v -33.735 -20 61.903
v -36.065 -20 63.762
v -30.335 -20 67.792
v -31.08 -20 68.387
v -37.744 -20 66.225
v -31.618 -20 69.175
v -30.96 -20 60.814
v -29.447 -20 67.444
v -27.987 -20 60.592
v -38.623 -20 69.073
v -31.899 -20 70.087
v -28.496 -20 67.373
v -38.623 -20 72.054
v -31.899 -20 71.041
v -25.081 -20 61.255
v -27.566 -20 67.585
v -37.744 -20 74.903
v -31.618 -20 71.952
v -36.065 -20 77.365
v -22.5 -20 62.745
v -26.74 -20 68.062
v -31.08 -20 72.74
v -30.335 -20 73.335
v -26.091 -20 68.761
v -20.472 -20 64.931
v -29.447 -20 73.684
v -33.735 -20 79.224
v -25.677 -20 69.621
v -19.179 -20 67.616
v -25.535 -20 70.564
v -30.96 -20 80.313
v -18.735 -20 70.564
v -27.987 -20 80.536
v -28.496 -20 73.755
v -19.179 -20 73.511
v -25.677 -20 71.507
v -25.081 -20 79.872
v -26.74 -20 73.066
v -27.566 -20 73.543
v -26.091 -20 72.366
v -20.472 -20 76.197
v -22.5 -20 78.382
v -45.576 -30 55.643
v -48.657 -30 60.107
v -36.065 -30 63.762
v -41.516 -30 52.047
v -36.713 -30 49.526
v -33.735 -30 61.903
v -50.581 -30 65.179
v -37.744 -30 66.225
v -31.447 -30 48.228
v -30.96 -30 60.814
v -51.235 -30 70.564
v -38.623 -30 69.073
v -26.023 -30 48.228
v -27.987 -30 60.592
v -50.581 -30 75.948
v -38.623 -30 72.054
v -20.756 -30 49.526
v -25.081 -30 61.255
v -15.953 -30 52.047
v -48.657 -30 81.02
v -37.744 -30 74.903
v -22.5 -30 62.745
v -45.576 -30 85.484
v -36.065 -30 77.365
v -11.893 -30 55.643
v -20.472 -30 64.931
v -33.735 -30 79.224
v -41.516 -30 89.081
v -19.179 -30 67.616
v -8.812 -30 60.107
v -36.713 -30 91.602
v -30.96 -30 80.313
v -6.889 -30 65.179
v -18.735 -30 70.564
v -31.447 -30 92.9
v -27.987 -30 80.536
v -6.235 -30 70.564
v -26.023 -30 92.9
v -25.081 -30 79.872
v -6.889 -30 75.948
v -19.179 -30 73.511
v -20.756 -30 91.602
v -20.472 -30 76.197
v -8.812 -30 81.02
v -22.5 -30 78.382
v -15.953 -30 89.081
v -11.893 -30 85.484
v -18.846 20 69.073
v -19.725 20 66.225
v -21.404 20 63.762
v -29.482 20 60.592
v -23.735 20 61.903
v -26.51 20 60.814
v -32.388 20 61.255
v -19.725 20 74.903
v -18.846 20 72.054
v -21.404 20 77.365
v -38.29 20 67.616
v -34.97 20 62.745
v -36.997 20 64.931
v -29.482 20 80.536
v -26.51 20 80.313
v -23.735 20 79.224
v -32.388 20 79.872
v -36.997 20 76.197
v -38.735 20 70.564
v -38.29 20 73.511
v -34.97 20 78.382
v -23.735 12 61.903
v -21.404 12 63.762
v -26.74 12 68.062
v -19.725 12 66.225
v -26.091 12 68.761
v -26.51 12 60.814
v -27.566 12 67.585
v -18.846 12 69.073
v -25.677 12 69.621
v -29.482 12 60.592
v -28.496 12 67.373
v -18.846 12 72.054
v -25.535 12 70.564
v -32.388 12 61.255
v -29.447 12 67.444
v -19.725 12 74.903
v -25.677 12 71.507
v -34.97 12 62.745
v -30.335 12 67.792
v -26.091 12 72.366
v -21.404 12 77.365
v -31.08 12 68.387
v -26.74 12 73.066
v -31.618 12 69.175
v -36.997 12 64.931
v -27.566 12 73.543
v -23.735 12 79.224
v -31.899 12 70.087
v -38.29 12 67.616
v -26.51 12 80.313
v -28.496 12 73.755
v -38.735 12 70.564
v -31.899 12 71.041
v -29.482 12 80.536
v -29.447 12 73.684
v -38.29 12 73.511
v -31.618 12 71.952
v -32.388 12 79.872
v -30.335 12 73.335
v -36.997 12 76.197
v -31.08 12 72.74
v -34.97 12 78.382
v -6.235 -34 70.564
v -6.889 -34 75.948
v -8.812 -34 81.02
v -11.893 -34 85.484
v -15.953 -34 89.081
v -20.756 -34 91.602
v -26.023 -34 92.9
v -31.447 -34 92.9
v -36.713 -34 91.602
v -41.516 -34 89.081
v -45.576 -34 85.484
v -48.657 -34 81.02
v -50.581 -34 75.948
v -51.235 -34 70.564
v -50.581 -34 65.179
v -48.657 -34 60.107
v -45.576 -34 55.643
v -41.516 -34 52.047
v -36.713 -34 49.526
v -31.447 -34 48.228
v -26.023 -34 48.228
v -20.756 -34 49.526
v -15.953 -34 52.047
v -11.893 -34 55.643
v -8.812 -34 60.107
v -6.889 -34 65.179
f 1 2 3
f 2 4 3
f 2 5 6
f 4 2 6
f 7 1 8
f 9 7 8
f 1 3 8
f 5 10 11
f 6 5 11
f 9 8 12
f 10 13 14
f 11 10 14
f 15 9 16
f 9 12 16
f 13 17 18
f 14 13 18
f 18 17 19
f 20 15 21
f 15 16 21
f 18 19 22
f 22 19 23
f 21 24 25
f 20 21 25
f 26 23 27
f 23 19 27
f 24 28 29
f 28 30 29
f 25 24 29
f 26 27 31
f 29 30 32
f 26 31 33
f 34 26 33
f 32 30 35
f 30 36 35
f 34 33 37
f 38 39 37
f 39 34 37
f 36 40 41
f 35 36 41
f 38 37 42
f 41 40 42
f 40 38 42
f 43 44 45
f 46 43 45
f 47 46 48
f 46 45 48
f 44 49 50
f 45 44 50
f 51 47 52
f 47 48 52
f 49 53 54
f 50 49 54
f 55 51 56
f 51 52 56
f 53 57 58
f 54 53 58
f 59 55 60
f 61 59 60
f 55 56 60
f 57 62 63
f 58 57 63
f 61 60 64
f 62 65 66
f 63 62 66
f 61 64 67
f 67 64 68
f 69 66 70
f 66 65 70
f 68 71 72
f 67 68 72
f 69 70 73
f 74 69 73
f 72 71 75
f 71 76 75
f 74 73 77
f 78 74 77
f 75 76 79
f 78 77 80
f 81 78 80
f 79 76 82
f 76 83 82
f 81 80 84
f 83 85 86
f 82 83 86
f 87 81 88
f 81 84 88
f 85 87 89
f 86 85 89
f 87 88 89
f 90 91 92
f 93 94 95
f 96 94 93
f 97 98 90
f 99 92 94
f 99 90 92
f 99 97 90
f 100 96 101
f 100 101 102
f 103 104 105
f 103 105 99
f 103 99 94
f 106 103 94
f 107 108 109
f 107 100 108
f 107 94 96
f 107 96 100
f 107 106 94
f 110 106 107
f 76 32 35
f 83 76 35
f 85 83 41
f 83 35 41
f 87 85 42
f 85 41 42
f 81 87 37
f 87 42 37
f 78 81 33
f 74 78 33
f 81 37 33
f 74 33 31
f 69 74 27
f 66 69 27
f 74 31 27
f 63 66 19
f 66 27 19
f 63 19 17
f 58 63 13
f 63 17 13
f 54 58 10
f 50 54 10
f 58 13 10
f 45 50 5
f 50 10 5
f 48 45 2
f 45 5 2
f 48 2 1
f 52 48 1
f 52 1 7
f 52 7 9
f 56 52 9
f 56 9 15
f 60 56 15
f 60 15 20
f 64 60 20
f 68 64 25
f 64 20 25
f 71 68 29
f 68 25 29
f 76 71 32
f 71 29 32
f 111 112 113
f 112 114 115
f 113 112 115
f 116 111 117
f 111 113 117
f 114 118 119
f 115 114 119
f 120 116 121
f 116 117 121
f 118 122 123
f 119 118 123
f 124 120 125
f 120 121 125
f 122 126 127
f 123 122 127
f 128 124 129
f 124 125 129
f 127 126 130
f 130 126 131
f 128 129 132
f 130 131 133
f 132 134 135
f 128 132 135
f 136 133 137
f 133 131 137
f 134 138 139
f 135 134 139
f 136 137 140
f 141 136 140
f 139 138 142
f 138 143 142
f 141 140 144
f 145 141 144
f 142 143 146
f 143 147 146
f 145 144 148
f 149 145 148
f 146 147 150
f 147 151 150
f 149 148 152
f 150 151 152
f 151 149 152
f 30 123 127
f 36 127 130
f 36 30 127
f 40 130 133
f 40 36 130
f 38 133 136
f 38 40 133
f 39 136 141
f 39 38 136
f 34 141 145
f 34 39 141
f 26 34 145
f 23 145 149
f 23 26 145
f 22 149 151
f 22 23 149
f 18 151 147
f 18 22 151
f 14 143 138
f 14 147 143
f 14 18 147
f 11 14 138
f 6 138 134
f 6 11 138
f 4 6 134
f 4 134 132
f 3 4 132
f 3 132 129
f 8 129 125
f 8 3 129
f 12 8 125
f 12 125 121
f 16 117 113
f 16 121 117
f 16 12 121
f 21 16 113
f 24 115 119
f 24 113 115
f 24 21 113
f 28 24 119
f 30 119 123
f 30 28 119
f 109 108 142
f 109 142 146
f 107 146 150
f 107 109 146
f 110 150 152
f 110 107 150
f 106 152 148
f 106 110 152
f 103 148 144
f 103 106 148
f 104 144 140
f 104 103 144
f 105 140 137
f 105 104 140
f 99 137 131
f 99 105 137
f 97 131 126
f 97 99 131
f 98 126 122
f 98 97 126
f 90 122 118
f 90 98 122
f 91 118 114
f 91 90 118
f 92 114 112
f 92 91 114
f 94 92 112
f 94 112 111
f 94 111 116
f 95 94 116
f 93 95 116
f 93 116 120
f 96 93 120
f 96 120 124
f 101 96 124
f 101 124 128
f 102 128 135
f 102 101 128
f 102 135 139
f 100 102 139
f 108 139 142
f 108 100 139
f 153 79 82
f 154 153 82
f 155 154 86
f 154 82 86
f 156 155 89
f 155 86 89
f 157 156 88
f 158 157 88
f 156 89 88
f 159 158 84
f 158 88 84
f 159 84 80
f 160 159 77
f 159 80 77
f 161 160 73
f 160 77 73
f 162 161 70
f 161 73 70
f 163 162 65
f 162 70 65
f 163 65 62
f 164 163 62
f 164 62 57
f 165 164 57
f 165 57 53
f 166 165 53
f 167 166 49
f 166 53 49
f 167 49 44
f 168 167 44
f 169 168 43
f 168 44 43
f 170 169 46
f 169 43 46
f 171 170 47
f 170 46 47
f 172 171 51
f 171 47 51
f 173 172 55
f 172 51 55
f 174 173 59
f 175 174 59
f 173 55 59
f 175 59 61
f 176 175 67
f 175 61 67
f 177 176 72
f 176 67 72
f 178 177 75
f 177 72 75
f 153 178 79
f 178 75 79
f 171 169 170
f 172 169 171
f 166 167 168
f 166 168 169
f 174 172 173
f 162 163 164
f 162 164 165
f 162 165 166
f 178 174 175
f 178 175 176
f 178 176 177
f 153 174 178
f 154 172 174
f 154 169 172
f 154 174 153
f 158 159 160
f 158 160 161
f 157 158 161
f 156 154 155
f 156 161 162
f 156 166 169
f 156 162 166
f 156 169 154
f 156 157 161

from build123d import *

# Parameters (mm, degrees)
F0_R     = 3.2
F1_DEPTH = 20
F2_R     = 10
F3_DEPTH = 10
F4_R     = 22.5
F4_R_2   = 10
F5_DEPTH = 4
F6_R     = 10
F6_R_2   = 3.2
F7_DEPTH = 8


with BuildPart() as f1:
    # F0 (on Front) → F1 (new body, symmetric)
    with BuildSketch(Plane.XZ):
        with Locations((-28.7347137928, 70.5637484789)):
            Circle(F0_R)
    extrude(amount=F1_DEPTH, both=True)

    # F2 (on face) → F3 (join)
    with BuildSketch(Plane.XZ.offset(20)):
        with Locations((-28.7347137928, 70.5637484789)):
            Circle(F2_R)
    extrude(amount=F3_DEPTH)

    # F4 (on face) → F5 (join)
    with BuildSketch(Plane.XZ.offset(30)):
        with Locations((-28.7347137928, 70.5637484789)):
            Circle(F4_R)
        with Locations((-28.7347137928, 70.5637484789)):
            Circle(F4_R_2, mode=Mode.SUBTRACT)
        with Locations((-28.7347137928, 70.5637484789)):
            Circle(F4_R_2)
    extrude(amount=F5_DEPTH)

    # F6 (on face) → F7 (join)
    with BuildSketch(Plane(origin=(0, 20, 0), x_dir=(-1, 0, 0), z_dir=(0, 1, 0))):
        with Locations((28.7347137928, 70.5637484789)):
            Circle(F6_R)
        with Locations((28.7347137928, 70.5637484789)):
            Circle(F6_R_2, mode=Mode.SUBTRACT)
    extrude(amount=-F7_DEPTH)


solid = f1.part
